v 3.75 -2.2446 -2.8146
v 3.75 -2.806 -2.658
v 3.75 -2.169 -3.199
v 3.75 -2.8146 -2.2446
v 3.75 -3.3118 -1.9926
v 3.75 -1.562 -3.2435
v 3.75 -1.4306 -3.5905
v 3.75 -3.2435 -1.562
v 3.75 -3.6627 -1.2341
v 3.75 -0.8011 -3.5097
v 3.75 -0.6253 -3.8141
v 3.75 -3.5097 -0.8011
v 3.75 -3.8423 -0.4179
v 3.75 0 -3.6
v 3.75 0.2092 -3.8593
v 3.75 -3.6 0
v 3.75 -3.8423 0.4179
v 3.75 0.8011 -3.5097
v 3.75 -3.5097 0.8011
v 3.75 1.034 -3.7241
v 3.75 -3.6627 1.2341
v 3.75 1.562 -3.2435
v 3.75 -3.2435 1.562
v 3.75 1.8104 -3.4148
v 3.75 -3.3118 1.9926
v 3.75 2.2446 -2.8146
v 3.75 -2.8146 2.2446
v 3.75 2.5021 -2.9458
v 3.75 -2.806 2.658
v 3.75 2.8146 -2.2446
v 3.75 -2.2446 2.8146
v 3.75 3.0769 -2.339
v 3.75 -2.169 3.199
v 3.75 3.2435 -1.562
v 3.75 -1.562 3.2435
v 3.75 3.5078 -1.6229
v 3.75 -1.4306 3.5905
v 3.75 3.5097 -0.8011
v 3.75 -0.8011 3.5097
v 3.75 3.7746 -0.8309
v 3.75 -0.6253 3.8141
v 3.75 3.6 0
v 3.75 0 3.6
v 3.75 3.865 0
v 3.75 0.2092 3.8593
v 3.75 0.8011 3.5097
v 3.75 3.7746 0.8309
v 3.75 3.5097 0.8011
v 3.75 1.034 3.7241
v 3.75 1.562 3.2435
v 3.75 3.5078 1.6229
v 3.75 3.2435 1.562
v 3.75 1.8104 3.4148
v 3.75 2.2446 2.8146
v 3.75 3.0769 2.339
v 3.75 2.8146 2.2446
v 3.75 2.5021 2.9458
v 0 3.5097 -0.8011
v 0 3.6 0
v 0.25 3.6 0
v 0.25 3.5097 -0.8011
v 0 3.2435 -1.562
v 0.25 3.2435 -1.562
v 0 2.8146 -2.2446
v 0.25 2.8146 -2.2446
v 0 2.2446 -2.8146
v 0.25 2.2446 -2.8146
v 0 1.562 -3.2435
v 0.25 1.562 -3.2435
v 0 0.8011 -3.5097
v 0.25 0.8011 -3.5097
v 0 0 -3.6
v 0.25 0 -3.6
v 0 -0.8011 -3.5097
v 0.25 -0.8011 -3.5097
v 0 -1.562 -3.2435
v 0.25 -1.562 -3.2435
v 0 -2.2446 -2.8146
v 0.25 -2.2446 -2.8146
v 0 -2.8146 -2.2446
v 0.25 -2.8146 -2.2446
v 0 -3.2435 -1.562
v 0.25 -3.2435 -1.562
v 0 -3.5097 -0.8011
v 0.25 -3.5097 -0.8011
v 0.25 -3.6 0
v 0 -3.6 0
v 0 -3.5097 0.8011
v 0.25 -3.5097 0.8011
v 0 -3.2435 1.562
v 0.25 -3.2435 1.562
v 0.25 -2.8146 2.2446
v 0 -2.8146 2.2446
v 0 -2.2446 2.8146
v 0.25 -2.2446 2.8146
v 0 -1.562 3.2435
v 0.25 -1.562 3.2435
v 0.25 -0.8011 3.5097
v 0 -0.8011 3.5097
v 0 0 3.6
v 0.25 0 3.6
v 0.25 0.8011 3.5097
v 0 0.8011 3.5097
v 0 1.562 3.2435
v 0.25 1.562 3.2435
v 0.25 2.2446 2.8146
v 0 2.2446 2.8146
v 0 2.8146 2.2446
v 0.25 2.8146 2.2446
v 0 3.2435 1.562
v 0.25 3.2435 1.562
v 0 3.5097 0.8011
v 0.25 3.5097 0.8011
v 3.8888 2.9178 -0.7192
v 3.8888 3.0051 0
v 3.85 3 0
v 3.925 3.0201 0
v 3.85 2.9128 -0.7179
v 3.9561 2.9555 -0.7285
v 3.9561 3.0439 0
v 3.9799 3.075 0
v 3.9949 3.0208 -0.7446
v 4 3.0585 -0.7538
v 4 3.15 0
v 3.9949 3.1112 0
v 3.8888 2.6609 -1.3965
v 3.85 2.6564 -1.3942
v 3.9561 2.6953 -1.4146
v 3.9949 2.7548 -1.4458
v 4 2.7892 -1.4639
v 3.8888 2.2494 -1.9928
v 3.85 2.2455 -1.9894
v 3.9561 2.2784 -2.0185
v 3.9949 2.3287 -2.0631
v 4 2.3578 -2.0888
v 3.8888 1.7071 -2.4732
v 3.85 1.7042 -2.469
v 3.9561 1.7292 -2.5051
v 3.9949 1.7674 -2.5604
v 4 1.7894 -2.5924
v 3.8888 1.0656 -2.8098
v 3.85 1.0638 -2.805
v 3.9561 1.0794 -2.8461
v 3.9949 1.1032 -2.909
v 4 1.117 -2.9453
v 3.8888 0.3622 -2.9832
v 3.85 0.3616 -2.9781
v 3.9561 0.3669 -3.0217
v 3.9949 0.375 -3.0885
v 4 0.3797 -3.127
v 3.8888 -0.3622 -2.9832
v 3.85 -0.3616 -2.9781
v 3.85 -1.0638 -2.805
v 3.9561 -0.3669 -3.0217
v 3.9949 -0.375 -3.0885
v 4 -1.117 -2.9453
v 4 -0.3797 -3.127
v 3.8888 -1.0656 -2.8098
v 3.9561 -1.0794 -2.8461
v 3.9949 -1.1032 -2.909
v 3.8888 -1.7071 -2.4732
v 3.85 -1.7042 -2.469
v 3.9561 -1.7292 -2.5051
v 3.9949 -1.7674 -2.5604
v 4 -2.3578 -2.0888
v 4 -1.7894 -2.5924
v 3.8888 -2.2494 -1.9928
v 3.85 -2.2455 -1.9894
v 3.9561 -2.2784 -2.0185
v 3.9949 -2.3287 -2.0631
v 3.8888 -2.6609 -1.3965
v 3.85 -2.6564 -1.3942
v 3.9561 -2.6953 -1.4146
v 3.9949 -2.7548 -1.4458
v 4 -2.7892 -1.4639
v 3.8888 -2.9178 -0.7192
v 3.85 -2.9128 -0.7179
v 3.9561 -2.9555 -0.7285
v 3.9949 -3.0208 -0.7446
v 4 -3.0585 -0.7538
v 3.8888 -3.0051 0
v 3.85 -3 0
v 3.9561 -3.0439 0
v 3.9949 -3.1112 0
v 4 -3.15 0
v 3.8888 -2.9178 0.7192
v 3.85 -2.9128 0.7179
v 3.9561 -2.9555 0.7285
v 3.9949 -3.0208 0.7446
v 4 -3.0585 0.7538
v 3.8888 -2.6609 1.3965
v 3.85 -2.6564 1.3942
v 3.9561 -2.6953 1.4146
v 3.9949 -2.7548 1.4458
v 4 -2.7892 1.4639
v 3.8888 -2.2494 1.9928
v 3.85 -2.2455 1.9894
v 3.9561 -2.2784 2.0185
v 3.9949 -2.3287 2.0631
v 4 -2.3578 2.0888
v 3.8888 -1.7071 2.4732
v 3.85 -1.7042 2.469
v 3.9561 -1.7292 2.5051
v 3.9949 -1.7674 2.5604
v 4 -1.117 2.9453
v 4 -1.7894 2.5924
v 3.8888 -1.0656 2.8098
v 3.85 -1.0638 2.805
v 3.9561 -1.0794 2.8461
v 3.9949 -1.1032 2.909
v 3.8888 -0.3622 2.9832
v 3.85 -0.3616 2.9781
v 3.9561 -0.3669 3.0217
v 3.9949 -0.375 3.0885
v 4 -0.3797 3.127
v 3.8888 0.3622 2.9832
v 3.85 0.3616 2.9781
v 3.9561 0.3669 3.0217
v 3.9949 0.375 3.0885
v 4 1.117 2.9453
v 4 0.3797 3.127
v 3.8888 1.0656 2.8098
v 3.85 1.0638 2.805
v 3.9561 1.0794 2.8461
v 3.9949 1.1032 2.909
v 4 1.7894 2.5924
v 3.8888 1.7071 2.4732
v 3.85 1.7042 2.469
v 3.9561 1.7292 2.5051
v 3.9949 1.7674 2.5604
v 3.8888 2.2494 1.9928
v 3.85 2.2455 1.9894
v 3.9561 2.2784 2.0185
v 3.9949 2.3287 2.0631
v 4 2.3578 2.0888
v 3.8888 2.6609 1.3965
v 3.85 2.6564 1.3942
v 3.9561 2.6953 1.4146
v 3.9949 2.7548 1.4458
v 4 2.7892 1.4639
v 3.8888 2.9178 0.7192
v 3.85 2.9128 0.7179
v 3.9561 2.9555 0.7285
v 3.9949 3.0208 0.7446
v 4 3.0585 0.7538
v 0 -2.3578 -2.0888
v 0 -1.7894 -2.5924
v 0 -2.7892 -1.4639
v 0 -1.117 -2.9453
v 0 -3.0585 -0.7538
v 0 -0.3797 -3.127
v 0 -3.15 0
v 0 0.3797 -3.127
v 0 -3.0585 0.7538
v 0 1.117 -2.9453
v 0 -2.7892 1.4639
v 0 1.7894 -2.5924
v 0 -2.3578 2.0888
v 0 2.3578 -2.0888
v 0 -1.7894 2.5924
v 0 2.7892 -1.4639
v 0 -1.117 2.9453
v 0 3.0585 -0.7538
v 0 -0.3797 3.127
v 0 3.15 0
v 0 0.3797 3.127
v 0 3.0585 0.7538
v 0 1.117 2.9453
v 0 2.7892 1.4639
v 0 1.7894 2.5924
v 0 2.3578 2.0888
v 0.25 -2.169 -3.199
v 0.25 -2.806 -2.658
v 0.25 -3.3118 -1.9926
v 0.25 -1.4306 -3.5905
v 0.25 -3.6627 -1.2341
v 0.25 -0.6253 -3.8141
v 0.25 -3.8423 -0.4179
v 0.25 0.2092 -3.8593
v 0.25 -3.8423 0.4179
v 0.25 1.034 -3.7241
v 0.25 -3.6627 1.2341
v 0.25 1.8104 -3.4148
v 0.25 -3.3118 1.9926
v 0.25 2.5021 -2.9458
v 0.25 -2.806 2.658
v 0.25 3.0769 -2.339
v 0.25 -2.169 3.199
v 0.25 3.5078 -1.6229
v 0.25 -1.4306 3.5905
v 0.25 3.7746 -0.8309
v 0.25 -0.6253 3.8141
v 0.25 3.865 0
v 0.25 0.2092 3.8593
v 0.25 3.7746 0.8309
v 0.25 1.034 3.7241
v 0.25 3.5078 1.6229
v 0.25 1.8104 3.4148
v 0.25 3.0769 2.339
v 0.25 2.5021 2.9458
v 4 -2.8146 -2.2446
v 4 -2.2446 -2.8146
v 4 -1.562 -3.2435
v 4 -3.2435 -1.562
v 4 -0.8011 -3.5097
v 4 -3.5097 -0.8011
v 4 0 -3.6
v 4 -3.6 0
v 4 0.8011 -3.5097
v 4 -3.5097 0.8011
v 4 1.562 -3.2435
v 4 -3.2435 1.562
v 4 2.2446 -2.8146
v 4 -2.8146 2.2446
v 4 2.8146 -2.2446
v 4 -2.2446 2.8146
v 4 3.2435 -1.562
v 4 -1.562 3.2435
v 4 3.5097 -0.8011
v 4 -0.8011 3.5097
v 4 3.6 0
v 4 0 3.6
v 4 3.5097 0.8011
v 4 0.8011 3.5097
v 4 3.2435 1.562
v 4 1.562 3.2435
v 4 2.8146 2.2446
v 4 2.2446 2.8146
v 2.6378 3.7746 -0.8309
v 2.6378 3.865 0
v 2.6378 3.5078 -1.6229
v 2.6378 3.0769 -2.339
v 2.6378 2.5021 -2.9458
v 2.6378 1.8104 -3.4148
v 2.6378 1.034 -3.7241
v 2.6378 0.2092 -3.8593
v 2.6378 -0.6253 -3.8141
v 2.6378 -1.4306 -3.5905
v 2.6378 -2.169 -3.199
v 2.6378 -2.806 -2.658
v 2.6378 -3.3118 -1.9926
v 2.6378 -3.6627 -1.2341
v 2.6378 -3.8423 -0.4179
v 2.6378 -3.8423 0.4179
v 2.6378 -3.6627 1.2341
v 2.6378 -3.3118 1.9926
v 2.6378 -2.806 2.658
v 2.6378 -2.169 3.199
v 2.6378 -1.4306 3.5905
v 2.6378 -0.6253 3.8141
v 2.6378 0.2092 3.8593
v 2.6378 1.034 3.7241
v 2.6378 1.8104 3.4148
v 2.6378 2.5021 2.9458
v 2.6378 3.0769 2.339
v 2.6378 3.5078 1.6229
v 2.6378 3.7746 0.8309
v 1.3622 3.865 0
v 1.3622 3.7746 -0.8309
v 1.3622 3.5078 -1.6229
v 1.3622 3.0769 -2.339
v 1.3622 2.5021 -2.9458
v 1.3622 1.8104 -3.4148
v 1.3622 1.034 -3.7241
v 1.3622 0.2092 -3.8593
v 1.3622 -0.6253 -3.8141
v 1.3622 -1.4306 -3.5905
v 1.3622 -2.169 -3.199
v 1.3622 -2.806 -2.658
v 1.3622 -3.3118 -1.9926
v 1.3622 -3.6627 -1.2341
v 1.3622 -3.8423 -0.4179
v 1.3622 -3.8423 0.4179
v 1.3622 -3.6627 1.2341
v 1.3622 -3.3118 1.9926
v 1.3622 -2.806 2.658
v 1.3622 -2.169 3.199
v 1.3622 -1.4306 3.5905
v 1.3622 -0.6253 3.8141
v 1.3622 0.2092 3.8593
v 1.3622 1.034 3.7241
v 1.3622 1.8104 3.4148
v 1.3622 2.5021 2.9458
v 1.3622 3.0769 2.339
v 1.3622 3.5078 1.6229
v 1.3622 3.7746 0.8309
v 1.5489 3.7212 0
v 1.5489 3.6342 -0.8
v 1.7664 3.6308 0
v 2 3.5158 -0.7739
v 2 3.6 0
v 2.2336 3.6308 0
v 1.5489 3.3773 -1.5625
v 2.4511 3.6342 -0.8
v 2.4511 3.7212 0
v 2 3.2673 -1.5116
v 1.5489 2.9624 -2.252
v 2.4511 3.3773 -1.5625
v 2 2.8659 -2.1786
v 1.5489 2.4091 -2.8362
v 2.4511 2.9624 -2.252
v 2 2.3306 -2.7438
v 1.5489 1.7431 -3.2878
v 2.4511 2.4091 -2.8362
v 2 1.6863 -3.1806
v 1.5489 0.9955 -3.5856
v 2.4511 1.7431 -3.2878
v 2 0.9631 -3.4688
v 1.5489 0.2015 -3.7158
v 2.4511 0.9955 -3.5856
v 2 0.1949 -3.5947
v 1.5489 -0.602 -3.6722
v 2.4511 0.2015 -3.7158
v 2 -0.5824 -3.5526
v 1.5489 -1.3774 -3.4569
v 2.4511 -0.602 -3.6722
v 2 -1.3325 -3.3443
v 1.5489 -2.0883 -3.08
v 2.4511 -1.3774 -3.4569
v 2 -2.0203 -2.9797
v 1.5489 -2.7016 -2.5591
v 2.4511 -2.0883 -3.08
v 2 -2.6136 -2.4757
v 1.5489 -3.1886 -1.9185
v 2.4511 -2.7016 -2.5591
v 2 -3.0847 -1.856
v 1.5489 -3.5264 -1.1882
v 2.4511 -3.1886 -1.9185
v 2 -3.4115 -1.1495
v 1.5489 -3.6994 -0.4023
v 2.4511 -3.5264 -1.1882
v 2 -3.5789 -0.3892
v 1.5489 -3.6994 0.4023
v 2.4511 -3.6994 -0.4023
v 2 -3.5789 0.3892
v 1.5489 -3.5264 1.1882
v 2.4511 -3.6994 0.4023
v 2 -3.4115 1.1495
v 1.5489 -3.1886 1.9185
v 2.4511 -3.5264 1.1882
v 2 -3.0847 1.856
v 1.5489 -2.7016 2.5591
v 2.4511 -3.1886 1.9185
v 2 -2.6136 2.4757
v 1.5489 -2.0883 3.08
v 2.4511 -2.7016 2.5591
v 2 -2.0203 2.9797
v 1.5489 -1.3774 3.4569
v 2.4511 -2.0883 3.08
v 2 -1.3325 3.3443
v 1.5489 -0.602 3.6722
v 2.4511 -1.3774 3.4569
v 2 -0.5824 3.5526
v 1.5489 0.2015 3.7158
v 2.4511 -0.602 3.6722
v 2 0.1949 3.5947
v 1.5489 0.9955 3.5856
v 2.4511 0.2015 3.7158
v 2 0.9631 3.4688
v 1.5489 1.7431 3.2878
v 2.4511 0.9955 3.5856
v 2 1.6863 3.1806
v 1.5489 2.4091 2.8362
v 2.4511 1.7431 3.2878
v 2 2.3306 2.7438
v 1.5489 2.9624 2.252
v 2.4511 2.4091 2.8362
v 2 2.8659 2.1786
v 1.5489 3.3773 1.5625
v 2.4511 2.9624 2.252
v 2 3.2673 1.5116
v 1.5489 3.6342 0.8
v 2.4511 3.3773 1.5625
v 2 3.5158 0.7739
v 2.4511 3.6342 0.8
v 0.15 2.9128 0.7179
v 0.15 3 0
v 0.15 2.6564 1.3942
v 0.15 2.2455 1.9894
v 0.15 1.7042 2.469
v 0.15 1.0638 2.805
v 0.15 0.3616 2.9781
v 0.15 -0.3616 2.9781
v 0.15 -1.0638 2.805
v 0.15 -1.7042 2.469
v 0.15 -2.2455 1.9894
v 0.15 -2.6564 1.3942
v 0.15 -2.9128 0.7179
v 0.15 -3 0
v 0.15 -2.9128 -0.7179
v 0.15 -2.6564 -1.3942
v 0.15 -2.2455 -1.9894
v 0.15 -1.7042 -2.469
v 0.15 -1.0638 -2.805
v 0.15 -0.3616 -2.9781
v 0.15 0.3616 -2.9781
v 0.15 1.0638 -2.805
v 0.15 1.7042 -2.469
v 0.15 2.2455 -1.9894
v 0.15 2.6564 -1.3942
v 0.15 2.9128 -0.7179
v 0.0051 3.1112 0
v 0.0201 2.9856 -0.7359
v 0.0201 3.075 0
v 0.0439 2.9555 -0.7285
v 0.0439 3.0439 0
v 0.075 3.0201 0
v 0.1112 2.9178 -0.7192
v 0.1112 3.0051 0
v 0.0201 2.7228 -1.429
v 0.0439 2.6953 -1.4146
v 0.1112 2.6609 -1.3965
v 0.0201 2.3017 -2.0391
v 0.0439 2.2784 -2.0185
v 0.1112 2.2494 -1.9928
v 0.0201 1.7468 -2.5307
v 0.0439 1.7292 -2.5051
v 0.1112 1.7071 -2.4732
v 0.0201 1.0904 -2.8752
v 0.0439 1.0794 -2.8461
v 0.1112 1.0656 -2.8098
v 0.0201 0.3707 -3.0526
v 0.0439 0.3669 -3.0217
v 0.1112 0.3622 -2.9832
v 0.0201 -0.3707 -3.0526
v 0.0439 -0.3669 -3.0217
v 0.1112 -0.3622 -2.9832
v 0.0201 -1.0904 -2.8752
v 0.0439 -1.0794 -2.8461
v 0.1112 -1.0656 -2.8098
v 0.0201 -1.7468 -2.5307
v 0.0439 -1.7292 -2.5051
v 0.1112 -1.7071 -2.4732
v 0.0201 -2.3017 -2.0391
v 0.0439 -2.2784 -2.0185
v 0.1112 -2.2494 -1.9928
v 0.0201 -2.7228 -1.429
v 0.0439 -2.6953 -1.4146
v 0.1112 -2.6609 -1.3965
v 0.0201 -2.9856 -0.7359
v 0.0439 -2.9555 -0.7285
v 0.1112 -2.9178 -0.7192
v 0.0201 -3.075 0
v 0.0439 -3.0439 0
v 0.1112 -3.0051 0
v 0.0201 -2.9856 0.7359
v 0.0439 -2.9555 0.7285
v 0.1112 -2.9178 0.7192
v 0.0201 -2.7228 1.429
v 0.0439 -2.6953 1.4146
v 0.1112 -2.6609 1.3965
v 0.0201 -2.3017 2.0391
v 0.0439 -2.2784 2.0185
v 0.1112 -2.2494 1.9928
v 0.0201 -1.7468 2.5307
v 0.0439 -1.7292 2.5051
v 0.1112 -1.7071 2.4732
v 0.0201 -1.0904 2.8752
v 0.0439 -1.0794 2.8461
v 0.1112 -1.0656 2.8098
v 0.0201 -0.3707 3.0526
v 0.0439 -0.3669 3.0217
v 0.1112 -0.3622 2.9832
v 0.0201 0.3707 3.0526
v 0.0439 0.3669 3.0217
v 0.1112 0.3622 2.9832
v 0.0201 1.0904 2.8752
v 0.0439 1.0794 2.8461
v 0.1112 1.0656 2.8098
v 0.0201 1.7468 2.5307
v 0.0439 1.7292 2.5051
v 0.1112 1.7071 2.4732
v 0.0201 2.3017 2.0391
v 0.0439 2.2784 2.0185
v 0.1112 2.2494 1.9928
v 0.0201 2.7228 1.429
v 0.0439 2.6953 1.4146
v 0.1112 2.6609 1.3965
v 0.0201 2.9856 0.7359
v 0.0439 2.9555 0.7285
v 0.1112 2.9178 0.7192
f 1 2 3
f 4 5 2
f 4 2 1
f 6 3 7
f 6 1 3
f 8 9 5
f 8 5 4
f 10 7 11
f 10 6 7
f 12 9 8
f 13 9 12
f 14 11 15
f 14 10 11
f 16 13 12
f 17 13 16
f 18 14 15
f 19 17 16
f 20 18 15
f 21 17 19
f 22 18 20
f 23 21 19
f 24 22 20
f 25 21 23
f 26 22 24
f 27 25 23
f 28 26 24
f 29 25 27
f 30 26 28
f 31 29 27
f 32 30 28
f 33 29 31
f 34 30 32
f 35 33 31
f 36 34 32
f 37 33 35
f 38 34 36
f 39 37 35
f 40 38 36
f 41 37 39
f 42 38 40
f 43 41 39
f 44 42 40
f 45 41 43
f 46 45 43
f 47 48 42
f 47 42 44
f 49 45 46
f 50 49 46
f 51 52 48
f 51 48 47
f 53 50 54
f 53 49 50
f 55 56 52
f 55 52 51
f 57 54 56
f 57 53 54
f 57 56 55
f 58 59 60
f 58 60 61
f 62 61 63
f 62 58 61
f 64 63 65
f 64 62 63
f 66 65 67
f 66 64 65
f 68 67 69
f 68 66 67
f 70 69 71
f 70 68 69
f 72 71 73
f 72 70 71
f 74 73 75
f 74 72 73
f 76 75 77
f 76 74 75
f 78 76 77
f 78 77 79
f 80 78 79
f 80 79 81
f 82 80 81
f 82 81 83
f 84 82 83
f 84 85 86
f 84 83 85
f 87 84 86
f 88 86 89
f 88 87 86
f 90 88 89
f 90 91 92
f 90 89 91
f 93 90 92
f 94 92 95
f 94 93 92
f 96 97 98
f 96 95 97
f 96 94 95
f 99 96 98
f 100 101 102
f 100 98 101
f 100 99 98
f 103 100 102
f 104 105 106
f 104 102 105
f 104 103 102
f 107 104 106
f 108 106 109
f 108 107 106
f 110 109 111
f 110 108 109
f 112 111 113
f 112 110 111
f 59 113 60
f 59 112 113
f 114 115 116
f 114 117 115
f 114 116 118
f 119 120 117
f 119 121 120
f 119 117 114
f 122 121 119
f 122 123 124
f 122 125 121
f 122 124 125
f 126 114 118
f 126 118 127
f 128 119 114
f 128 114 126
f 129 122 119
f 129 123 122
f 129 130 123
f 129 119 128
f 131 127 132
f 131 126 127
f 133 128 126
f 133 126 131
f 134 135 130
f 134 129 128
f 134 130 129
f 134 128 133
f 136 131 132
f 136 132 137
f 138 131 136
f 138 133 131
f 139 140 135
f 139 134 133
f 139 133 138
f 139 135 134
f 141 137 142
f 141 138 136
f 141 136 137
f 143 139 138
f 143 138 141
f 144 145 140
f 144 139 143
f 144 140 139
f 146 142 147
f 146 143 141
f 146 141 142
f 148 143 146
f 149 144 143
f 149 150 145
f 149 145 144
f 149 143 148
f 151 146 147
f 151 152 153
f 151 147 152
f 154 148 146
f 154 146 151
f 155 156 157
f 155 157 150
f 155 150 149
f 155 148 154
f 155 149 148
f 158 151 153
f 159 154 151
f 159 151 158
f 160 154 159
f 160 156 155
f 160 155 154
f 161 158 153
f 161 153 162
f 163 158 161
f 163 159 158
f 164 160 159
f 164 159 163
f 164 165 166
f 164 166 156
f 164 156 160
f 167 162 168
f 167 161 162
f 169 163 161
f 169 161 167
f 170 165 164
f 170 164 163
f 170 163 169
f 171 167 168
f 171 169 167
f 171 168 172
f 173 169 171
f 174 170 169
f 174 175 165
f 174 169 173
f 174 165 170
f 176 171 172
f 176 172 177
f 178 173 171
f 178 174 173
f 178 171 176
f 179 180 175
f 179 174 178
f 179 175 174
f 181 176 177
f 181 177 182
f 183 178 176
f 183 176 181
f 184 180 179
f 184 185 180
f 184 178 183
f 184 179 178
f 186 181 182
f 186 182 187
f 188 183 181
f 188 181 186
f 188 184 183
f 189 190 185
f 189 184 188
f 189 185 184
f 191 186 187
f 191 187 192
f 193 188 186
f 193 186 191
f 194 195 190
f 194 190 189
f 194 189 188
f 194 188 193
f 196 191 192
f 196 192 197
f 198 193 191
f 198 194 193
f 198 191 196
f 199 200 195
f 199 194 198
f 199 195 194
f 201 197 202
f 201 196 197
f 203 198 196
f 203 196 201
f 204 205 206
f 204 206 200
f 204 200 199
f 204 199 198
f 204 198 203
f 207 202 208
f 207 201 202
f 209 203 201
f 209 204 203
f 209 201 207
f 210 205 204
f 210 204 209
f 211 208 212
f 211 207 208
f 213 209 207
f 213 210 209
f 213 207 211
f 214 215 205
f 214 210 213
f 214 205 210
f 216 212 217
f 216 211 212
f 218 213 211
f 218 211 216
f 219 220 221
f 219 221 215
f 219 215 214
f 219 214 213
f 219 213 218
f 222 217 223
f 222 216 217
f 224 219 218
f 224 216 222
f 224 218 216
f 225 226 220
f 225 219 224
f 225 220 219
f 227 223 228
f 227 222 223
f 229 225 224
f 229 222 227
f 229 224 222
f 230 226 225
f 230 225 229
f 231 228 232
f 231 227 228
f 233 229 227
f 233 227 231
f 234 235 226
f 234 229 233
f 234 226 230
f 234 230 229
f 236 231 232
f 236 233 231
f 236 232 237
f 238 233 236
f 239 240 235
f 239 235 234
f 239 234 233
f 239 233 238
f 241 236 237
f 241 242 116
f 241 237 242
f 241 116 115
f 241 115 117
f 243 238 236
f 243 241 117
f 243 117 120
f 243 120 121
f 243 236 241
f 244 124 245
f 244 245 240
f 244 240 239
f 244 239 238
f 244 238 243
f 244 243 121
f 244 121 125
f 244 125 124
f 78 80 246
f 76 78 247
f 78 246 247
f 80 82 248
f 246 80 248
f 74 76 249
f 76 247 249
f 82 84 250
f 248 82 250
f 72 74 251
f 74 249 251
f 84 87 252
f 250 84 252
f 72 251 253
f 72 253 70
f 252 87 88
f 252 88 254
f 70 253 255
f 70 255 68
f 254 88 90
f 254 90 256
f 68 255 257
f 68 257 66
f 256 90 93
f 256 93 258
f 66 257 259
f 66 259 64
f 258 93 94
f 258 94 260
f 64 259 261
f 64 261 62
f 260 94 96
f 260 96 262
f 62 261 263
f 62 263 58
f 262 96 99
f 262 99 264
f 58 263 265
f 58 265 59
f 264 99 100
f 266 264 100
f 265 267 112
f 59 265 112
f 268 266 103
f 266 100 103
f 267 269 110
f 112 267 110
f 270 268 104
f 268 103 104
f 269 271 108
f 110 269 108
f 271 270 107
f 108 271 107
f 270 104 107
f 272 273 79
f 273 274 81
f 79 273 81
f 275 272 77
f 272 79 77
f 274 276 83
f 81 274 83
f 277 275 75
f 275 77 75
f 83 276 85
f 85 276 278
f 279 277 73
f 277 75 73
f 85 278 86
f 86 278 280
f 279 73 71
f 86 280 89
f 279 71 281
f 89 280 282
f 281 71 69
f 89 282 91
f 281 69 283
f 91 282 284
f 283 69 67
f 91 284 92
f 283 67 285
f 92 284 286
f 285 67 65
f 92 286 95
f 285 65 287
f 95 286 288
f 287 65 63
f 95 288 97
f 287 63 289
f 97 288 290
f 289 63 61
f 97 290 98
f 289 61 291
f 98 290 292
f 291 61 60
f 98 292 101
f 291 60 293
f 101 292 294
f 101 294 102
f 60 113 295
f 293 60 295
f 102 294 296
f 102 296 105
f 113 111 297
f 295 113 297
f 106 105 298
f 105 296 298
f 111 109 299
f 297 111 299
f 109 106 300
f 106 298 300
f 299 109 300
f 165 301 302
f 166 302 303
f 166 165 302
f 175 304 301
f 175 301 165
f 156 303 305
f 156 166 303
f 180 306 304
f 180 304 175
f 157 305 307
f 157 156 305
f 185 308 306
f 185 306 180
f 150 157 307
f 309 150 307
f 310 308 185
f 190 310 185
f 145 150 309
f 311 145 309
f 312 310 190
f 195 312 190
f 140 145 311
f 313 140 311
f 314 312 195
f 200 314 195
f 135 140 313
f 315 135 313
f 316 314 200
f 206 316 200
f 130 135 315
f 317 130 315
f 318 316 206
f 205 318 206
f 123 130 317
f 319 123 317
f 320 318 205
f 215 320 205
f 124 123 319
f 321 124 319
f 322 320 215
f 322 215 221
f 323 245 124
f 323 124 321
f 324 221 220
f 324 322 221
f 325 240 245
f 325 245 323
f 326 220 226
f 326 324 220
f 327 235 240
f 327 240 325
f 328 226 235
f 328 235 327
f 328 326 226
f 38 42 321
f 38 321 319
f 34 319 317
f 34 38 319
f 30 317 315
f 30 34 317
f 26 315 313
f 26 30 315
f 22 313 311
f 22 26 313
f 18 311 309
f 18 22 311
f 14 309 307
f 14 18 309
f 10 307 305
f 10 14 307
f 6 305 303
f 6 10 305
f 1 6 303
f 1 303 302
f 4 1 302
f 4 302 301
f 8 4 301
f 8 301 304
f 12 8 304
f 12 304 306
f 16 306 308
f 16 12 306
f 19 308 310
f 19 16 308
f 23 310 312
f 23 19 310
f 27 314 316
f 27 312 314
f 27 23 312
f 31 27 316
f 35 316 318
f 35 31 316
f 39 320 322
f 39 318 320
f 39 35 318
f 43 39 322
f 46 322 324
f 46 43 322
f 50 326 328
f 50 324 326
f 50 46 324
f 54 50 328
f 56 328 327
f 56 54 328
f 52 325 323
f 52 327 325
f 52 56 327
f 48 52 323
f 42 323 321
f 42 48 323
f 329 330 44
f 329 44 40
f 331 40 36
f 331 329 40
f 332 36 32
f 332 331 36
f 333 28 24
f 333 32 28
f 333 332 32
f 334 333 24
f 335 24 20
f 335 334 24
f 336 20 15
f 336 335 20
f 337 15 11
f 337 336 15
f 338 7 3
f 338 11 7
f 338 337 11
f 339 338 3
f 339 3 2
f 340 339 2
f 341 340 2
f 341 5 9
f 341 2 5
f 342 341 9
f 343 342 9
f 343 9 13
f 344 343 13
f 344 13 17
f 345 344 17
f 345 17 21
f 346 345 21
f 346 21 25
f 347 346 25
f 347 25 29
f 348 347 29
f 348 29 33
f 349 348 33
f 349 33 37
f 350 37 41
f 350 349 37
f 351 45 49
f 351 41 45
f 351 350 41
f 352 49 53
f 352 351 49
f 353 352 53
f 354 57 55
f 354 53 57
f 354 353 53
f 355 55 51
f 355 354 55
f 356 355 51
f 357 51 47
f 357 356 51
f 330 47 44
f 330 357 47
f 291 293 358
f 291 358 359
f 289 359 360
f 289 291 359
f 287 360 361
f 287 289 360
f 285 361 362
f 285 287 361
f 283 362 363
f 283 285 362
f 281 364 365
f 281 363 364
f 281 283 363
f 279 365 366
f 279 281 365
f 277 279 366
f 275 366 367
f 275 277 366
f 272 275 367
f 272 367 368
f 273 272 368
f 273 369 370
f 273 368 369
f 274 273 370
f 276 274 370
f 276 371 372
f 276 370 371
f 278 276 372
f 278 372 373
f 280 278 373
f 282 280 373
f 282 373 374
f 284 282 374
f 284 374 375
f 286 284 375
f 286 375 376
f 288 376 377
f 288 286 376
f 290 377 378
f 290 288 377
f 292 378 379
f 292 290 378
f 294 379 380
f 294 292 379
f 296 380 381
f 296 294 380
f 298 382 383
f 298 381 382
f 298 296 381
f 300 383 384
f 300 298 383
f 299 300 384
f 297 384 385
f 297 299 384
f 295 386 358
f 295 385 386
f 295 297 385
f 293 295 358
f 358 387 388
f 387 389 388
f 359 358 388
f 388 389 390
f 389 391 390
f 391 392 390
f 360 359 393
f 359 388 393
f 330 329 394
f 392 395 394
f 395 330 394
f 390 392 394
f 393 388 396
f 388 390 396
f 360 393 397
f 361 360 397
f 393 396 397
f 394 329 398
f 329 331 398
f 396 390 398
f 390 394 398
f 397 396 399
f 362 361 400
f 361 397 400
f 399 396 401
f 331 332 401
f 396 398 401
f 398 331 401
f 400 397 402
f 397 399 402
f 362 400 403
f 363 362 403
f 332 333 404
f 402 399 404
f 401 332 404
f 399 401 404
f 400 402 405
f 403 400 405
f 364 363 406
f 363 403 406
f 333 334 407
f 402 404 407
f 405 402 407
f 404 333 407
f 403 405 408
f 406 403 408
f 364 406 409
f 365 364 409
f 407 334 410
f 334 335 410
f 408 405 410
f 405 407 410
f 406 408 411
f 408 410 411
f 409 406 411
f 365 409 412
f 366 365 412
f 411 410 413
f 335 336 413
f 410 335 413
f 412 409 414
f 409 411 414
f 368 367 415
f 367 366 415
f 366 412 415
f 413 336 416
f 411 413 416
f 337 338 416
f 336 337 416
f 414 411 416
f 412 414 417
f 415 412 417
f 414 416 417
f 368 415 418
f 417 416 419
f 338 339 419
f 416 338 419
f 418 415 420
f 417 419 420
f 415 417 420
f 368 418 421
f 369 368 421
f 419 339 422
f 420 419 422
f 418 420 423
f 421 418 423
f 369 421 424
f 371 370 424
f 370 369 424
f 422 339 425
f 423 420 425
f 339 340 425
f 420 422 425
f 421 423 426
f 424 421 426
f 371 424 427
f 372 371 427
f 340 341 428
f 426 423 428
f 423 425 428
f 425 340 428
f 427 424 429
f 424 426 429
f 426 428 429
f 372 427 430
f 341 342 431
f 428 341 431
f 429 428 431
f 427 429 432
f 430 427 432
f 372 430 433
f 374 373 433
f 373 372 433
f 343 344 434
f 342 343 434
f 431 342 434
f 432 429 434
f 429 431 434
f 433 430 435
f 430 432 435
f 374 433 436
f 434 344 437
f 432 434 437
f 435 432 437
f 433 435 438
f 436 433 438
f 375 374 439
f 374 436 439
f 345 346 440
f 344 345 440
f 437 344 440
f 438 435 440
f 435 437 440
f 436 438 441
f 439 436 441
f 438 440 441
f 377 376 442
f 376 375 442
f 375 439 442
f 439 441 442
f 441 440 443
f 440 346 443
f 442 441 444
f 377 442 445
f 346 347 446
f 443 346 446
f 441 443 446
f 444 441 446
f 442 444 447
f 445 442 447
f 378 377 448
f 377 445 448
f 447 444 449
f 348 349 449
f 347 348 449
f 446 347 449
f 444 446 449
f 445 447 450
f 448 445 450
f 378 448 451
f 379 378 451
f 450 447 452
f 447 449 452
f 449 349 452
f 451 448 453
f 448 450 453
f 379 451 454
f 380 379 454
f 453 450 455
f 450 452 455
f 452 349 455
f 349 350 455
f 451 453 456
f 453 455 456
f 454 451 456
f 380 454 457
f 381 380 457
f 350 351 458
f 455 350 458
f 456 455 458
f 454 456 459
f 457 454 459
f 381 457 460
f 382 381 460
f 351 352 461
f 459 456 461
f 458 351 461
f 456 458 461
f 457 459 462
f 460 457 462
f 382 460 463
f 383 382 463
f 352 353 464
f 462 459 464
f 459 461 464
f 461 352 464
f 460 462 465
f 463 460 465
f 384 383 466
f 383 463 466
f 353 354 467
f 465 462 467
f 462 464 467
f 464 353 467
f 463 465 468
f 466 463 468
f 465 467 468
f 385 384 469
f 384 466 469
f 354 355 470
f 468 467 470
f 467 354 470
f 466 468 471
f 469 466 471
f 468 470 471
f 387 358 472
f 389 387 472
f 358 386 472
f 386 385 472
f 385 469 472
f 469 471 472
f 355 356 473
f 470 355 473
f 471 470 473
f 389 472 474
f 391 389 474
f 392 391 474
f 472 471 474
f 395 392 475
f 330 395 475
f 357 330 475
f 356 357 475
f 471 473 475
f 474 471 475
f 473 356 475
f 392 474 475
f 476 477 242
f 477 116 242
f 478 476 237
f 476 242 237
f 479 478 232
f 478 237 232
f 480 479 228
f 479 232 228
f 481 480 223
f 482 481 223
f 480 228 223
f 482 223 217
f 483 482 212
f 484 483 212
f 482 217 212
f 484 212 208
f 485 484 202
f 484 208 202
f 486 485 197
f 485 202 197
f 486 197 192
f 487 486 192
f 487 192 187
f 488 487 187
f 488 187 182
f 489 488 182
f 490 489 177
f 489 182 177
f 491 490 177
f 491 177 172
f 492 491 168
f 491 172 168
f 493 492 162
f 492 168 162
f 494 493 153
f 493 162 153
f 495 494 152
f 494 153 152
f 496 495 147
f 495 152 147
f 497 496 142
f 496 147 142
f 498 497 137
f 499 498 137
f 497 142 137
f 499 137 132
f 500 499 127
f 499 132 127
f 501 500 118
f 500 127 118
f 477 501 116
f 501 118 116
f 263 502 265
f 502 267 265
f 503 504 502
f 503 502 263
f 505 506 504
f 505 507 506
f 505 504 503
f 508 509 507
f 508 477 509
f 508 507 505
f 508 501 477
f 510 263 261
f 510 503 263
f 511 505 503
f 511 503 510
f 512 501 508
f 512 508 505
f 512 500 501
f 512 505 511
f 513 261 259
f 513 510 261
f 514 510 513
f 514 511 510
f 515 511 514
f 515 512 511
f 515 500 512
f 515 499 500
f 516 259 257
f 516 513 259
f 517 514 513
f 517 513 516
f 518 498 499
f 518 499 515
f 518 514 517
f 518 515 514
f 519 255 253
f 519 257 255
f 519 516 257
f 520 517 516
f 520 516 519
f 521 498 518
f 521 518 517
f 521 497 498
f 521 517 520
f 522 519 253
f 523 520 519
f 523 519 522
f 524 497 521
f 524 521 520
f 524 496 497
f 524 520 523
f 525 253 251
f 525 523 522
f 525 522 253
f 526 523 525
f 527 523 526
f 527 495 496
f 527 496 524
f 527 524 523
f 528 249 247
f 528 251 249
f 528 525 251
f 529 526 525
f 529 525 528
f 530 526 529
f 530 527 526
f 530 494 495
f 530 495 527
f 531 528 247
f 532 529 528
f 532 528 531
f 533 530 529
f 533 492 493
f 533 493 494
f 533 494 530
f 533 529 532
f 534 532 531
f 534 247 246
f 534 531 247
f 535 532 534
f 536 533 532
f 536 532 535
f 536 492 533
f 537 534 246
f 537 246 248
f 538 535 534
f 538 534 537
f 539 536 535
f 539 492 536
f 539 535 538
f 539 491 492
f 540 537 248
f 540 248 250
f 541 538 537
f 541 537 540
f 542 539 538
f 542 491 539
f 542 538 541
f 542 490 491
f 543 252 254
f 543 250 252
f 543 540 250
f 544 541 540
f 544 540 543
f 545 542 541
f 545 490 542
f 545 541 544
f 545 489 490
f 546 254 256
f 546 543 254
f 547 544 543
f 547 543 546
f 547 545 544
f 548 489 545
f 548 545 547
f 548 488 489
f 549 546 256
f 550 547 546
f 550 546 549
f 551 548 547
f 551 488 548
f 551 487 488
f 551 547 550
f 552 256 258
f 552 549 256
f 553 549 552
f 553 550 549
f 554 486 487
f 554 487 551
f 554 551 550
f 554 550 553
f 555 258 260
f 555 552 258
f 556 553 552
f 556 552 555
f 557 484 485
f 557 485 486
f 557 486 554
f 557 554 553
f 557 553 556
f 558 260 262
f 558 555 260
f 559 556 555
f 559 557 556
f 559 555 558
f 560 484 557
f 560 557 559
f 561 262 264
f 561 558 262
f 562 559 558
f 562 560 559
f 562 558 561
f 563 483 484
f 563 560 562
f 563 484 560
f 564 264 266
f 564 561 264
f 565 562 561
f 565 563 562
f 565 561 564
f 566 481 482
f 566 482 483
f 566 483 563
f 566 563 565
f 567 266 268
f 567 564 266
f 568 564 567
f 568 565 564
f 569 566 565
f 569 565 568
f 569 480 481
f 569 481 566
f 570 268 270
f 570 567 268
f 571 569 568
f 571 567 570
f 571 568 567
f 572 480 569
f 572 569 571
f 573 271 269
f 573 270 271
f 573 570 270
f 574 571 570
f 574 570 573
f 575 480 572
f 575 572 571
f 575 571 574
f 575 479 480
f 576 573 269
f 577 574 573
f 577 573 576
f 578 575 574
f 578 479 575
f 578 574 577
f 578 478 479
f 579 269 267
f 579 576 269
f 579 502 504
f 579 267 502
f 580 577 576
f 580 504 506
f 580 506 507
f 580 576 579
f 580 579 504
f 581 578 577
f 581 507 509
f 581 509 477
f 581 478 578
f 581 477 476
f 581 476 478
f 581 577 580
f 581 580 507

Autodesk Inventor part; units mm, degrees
sketch "Sketch_2" plane through (0, 0, 0) normal (0, 0, 1) x (1, 0, 0)
  line L0 (4, 0) -> (0, 0)
  arc A0 (0, 3.15) -> (0.15, 3) centre (0.15, 3.15) ccw
  line L1 (0.15, 3) -> (3.85, 3)
  arc A1 (3.85, 3) -> (4, 3.15) centre (3.85, 3.15) ccw
  line L2 (4, 3.15) -> (4, 3.6)
  line L3 (4, 3.6) -> (3.75, 3.6)
  line L4 (3.75, 3.6) -> (3.75, 3.865)
  line L5 (3.75, 3.865) -> (2.6378, 3.865)
  arc A2 (1.3622, 3.865) -> (2.6378, 3.865) centre (2, 4.5) ccw
  line L6 (1.3622, 3.865) -> (0.25, 3.865)
  line L7 (0.25, 3.865) -> (0.25, 3.6)
  line L8 (0.25, 3.6) -> (0, 3.6)
  line L9 (0, 3.6) -> (0, 3.15)
revolve "Revolution1" add sketch "Sketch_2" angle 360 about axis through (4, 0, 0) along (1, 0, 0)
ref_plane "ip_st_1_1_XY" through (2, 4.5, 0) normal (1, 0, 0) x (0, 0, -1)
ref_plane "ip_st_1_1_YZ" through (2, 4.5, 0) normal (0, 0, -1) x (0, 1, 0)
ref_plane "ip_st_1_1_ZX" through (2, 4.5, 0) normal (0, 1, 0) x (1, 0, 0)
ref_plane "ip_st_1_10_XY" through (2, 0, -4.5) normal (1, 0, 0) x (0, 0, -1)
ref_plane "ip_st_1_10_YZ" through (2, 0, -4.5) normal (0, 0, -1) x (0, 1, 0)
ref_plane "ip_st_1_10_ZX" through (2, 0, -4.5) normal (0, 1, 0) x (1, 0, 0)
ref_plane "ip_st_1_11_XY" through (2, 2.25, -3.8971) normal (1, 0, 0) x (0, 0, -1)
ref_plane "ip_st_1_11_YZ" through (2, 2.25, -3.8971) normal (0, 0, -1) x (0, 1, 0)
ref_plane "ip_st_1_11_ZX" through (2, 2.25, -3.8971) normal (0, 1, 0) x (1, 0, 0)
ref_plane "ip_st_1_12_XY" through (2, 3.8971, -2.25) normal (1, 0, 0) x (0, 0, -1)
ref_plane "ip_st_1_12_YZ" through (2, 3.8971, -2.25) normal (0, 0, -1) x (0, 1, 0)
ref_plane "ip_st_1_12_ZX" through (2, 3.8971, -2.25) normal (0, 1, 0) x (1, 0, 0)
ref_plane "ip_st_1_2_XY" through (2, 3.8971, 2.25) normal (1, 0, 0) x (0, 0, -1)
ref_plane "ip_st_1_2_YZ" through (2, 3.8971, 2.25) normal (0, 0, -1) x (0, 1, 0)
ref_plane "ip_st_1_2_ZX" through (2, 3.8971, 2.25) normal (0, 1, 0) x (1, 0, 0)
ref_plane "ip_st_1_3_XY" through (2, 2.25, 3.8971) normal (1, 0, 0) x (0, 0, -1)
ref_plane "ip_st_1_3_YZ" through (2, 2.25, 3.8971) normal (0, 0, -1) x (0, 1, 0)
ref_plane "ip_st_1_3_ZX" through (2, 2.25, 3.8971) normal (0, 1, 0) x (1, 0, 0)
ref_plane "ip_st_1_4_XY" through (2, 0, 4.5) normal (1, 0, 0) x (0, 0, -1)
ref_plane "ip_st_1_4_YZ" through (2, 0, 4.5) normal (0, 0, -1) x (0, 1, 0)
ref_plane "ip_st_1_4_ZX" through (2, 0, 4.5) normal (0, 1, 0) x (1, 0, 0)
ref_plane "ip_st_1_5_XY" through (2, -2.25, 3.8971) normal (1, 0, 0) x (0, 0, -1)
ref_plane "ip_st_1_5_YZ" through (2, -2.25, 3.8971) normal (0, 0, -1) x (0, 1, 0)
ref_plane "ip_st_1_5_ZX" through (2, -2.25, 3.8971) normal (0, 1, 0) x (1, 0, 0)
ref_plane "ip_st_1_6_XY" through (2, -3.8971, 2.25) normal (1, 0, 0) x (0, 0, -1)
ref_plane "ip_st_1_6_YZ" through (2, -3.8971, 2.25) normal (0, 0, -1) x (0, 1, 0)
ref_plane "ip_st_1_6_ZX" through (2, -3.8971, 2.25) normal (0, 1, 0) x (1, 0, 0)
ref_plane "ip_st_1_7_XY" through (2, -4.5, 0) normal (1, 0, 0) x (0, 0, -1)
ref_plane "ip_st_1_7_YZ" through (2, -4.5, 0) normal (0, 0, -1) x (0, 1, 0)
ref_plane "ip_st_1_7_ZX" through (2, -4.5, 0) normal (0, 1, 0) x (1, 0, 0)
ref_plane "ip_st_1_8_XY" through (2, -3.8971, -2.25) normal (1, 0, 0) x (0, 0, -1)
ref_plane "ip_st_1_8_YZ" through (2, -3.8971, -2.25) normal (0, 0, -1) x (0, 1, 0)
ref_plane "ip_st_1_8_ZX" through (2, -3.8971, -2.25) normal (0, 1, 0) x (1, 0, 0)
ref_plane "ip_st_1_9_XY" through (2, -2.25, -3.8971) normal (1, 0, 0) x (0, 0, -1)
ref_plane "ip_st_1_9_YZ" through (2, -2.25, -3.8971) normal (0, 0, -1) x (0, 1, 0)
ref_plane "ip_st_1_9_ZX" through (2, -2.25, -3.8971) normal (0, 1, 0) x (1, 0, 0)
ref_plane "ip_st_1a_XY" through (0, 0, 0) normal (1, 0, 0) x (0, 0, -1)
ref_plane "ip_st_1a_YZ" through (0, 0, 0) normal (0, 0, -1) x (0, 1, 0)
ref_plane "ip_st_1a_ZX" through (0, 0, 0) normal (0, 1, 0) x (1, 0, 0)
ref_plane "ip_st_2a_XY" through (0.25, 0, 0) normal (1, 0, 0) x (0, 0, -1)
ref_plane "ip_st_2a_YZ" through (0.25, 0, 0) normal (0, 0, -1) x (0, 1, 0)
ref_plane "ip_st_2a_ZX" through (0.25, 0, 0) normal (0, 1, 0) x (1, 0, 0)
properties part number "MF126ZZ Inner Ring"
